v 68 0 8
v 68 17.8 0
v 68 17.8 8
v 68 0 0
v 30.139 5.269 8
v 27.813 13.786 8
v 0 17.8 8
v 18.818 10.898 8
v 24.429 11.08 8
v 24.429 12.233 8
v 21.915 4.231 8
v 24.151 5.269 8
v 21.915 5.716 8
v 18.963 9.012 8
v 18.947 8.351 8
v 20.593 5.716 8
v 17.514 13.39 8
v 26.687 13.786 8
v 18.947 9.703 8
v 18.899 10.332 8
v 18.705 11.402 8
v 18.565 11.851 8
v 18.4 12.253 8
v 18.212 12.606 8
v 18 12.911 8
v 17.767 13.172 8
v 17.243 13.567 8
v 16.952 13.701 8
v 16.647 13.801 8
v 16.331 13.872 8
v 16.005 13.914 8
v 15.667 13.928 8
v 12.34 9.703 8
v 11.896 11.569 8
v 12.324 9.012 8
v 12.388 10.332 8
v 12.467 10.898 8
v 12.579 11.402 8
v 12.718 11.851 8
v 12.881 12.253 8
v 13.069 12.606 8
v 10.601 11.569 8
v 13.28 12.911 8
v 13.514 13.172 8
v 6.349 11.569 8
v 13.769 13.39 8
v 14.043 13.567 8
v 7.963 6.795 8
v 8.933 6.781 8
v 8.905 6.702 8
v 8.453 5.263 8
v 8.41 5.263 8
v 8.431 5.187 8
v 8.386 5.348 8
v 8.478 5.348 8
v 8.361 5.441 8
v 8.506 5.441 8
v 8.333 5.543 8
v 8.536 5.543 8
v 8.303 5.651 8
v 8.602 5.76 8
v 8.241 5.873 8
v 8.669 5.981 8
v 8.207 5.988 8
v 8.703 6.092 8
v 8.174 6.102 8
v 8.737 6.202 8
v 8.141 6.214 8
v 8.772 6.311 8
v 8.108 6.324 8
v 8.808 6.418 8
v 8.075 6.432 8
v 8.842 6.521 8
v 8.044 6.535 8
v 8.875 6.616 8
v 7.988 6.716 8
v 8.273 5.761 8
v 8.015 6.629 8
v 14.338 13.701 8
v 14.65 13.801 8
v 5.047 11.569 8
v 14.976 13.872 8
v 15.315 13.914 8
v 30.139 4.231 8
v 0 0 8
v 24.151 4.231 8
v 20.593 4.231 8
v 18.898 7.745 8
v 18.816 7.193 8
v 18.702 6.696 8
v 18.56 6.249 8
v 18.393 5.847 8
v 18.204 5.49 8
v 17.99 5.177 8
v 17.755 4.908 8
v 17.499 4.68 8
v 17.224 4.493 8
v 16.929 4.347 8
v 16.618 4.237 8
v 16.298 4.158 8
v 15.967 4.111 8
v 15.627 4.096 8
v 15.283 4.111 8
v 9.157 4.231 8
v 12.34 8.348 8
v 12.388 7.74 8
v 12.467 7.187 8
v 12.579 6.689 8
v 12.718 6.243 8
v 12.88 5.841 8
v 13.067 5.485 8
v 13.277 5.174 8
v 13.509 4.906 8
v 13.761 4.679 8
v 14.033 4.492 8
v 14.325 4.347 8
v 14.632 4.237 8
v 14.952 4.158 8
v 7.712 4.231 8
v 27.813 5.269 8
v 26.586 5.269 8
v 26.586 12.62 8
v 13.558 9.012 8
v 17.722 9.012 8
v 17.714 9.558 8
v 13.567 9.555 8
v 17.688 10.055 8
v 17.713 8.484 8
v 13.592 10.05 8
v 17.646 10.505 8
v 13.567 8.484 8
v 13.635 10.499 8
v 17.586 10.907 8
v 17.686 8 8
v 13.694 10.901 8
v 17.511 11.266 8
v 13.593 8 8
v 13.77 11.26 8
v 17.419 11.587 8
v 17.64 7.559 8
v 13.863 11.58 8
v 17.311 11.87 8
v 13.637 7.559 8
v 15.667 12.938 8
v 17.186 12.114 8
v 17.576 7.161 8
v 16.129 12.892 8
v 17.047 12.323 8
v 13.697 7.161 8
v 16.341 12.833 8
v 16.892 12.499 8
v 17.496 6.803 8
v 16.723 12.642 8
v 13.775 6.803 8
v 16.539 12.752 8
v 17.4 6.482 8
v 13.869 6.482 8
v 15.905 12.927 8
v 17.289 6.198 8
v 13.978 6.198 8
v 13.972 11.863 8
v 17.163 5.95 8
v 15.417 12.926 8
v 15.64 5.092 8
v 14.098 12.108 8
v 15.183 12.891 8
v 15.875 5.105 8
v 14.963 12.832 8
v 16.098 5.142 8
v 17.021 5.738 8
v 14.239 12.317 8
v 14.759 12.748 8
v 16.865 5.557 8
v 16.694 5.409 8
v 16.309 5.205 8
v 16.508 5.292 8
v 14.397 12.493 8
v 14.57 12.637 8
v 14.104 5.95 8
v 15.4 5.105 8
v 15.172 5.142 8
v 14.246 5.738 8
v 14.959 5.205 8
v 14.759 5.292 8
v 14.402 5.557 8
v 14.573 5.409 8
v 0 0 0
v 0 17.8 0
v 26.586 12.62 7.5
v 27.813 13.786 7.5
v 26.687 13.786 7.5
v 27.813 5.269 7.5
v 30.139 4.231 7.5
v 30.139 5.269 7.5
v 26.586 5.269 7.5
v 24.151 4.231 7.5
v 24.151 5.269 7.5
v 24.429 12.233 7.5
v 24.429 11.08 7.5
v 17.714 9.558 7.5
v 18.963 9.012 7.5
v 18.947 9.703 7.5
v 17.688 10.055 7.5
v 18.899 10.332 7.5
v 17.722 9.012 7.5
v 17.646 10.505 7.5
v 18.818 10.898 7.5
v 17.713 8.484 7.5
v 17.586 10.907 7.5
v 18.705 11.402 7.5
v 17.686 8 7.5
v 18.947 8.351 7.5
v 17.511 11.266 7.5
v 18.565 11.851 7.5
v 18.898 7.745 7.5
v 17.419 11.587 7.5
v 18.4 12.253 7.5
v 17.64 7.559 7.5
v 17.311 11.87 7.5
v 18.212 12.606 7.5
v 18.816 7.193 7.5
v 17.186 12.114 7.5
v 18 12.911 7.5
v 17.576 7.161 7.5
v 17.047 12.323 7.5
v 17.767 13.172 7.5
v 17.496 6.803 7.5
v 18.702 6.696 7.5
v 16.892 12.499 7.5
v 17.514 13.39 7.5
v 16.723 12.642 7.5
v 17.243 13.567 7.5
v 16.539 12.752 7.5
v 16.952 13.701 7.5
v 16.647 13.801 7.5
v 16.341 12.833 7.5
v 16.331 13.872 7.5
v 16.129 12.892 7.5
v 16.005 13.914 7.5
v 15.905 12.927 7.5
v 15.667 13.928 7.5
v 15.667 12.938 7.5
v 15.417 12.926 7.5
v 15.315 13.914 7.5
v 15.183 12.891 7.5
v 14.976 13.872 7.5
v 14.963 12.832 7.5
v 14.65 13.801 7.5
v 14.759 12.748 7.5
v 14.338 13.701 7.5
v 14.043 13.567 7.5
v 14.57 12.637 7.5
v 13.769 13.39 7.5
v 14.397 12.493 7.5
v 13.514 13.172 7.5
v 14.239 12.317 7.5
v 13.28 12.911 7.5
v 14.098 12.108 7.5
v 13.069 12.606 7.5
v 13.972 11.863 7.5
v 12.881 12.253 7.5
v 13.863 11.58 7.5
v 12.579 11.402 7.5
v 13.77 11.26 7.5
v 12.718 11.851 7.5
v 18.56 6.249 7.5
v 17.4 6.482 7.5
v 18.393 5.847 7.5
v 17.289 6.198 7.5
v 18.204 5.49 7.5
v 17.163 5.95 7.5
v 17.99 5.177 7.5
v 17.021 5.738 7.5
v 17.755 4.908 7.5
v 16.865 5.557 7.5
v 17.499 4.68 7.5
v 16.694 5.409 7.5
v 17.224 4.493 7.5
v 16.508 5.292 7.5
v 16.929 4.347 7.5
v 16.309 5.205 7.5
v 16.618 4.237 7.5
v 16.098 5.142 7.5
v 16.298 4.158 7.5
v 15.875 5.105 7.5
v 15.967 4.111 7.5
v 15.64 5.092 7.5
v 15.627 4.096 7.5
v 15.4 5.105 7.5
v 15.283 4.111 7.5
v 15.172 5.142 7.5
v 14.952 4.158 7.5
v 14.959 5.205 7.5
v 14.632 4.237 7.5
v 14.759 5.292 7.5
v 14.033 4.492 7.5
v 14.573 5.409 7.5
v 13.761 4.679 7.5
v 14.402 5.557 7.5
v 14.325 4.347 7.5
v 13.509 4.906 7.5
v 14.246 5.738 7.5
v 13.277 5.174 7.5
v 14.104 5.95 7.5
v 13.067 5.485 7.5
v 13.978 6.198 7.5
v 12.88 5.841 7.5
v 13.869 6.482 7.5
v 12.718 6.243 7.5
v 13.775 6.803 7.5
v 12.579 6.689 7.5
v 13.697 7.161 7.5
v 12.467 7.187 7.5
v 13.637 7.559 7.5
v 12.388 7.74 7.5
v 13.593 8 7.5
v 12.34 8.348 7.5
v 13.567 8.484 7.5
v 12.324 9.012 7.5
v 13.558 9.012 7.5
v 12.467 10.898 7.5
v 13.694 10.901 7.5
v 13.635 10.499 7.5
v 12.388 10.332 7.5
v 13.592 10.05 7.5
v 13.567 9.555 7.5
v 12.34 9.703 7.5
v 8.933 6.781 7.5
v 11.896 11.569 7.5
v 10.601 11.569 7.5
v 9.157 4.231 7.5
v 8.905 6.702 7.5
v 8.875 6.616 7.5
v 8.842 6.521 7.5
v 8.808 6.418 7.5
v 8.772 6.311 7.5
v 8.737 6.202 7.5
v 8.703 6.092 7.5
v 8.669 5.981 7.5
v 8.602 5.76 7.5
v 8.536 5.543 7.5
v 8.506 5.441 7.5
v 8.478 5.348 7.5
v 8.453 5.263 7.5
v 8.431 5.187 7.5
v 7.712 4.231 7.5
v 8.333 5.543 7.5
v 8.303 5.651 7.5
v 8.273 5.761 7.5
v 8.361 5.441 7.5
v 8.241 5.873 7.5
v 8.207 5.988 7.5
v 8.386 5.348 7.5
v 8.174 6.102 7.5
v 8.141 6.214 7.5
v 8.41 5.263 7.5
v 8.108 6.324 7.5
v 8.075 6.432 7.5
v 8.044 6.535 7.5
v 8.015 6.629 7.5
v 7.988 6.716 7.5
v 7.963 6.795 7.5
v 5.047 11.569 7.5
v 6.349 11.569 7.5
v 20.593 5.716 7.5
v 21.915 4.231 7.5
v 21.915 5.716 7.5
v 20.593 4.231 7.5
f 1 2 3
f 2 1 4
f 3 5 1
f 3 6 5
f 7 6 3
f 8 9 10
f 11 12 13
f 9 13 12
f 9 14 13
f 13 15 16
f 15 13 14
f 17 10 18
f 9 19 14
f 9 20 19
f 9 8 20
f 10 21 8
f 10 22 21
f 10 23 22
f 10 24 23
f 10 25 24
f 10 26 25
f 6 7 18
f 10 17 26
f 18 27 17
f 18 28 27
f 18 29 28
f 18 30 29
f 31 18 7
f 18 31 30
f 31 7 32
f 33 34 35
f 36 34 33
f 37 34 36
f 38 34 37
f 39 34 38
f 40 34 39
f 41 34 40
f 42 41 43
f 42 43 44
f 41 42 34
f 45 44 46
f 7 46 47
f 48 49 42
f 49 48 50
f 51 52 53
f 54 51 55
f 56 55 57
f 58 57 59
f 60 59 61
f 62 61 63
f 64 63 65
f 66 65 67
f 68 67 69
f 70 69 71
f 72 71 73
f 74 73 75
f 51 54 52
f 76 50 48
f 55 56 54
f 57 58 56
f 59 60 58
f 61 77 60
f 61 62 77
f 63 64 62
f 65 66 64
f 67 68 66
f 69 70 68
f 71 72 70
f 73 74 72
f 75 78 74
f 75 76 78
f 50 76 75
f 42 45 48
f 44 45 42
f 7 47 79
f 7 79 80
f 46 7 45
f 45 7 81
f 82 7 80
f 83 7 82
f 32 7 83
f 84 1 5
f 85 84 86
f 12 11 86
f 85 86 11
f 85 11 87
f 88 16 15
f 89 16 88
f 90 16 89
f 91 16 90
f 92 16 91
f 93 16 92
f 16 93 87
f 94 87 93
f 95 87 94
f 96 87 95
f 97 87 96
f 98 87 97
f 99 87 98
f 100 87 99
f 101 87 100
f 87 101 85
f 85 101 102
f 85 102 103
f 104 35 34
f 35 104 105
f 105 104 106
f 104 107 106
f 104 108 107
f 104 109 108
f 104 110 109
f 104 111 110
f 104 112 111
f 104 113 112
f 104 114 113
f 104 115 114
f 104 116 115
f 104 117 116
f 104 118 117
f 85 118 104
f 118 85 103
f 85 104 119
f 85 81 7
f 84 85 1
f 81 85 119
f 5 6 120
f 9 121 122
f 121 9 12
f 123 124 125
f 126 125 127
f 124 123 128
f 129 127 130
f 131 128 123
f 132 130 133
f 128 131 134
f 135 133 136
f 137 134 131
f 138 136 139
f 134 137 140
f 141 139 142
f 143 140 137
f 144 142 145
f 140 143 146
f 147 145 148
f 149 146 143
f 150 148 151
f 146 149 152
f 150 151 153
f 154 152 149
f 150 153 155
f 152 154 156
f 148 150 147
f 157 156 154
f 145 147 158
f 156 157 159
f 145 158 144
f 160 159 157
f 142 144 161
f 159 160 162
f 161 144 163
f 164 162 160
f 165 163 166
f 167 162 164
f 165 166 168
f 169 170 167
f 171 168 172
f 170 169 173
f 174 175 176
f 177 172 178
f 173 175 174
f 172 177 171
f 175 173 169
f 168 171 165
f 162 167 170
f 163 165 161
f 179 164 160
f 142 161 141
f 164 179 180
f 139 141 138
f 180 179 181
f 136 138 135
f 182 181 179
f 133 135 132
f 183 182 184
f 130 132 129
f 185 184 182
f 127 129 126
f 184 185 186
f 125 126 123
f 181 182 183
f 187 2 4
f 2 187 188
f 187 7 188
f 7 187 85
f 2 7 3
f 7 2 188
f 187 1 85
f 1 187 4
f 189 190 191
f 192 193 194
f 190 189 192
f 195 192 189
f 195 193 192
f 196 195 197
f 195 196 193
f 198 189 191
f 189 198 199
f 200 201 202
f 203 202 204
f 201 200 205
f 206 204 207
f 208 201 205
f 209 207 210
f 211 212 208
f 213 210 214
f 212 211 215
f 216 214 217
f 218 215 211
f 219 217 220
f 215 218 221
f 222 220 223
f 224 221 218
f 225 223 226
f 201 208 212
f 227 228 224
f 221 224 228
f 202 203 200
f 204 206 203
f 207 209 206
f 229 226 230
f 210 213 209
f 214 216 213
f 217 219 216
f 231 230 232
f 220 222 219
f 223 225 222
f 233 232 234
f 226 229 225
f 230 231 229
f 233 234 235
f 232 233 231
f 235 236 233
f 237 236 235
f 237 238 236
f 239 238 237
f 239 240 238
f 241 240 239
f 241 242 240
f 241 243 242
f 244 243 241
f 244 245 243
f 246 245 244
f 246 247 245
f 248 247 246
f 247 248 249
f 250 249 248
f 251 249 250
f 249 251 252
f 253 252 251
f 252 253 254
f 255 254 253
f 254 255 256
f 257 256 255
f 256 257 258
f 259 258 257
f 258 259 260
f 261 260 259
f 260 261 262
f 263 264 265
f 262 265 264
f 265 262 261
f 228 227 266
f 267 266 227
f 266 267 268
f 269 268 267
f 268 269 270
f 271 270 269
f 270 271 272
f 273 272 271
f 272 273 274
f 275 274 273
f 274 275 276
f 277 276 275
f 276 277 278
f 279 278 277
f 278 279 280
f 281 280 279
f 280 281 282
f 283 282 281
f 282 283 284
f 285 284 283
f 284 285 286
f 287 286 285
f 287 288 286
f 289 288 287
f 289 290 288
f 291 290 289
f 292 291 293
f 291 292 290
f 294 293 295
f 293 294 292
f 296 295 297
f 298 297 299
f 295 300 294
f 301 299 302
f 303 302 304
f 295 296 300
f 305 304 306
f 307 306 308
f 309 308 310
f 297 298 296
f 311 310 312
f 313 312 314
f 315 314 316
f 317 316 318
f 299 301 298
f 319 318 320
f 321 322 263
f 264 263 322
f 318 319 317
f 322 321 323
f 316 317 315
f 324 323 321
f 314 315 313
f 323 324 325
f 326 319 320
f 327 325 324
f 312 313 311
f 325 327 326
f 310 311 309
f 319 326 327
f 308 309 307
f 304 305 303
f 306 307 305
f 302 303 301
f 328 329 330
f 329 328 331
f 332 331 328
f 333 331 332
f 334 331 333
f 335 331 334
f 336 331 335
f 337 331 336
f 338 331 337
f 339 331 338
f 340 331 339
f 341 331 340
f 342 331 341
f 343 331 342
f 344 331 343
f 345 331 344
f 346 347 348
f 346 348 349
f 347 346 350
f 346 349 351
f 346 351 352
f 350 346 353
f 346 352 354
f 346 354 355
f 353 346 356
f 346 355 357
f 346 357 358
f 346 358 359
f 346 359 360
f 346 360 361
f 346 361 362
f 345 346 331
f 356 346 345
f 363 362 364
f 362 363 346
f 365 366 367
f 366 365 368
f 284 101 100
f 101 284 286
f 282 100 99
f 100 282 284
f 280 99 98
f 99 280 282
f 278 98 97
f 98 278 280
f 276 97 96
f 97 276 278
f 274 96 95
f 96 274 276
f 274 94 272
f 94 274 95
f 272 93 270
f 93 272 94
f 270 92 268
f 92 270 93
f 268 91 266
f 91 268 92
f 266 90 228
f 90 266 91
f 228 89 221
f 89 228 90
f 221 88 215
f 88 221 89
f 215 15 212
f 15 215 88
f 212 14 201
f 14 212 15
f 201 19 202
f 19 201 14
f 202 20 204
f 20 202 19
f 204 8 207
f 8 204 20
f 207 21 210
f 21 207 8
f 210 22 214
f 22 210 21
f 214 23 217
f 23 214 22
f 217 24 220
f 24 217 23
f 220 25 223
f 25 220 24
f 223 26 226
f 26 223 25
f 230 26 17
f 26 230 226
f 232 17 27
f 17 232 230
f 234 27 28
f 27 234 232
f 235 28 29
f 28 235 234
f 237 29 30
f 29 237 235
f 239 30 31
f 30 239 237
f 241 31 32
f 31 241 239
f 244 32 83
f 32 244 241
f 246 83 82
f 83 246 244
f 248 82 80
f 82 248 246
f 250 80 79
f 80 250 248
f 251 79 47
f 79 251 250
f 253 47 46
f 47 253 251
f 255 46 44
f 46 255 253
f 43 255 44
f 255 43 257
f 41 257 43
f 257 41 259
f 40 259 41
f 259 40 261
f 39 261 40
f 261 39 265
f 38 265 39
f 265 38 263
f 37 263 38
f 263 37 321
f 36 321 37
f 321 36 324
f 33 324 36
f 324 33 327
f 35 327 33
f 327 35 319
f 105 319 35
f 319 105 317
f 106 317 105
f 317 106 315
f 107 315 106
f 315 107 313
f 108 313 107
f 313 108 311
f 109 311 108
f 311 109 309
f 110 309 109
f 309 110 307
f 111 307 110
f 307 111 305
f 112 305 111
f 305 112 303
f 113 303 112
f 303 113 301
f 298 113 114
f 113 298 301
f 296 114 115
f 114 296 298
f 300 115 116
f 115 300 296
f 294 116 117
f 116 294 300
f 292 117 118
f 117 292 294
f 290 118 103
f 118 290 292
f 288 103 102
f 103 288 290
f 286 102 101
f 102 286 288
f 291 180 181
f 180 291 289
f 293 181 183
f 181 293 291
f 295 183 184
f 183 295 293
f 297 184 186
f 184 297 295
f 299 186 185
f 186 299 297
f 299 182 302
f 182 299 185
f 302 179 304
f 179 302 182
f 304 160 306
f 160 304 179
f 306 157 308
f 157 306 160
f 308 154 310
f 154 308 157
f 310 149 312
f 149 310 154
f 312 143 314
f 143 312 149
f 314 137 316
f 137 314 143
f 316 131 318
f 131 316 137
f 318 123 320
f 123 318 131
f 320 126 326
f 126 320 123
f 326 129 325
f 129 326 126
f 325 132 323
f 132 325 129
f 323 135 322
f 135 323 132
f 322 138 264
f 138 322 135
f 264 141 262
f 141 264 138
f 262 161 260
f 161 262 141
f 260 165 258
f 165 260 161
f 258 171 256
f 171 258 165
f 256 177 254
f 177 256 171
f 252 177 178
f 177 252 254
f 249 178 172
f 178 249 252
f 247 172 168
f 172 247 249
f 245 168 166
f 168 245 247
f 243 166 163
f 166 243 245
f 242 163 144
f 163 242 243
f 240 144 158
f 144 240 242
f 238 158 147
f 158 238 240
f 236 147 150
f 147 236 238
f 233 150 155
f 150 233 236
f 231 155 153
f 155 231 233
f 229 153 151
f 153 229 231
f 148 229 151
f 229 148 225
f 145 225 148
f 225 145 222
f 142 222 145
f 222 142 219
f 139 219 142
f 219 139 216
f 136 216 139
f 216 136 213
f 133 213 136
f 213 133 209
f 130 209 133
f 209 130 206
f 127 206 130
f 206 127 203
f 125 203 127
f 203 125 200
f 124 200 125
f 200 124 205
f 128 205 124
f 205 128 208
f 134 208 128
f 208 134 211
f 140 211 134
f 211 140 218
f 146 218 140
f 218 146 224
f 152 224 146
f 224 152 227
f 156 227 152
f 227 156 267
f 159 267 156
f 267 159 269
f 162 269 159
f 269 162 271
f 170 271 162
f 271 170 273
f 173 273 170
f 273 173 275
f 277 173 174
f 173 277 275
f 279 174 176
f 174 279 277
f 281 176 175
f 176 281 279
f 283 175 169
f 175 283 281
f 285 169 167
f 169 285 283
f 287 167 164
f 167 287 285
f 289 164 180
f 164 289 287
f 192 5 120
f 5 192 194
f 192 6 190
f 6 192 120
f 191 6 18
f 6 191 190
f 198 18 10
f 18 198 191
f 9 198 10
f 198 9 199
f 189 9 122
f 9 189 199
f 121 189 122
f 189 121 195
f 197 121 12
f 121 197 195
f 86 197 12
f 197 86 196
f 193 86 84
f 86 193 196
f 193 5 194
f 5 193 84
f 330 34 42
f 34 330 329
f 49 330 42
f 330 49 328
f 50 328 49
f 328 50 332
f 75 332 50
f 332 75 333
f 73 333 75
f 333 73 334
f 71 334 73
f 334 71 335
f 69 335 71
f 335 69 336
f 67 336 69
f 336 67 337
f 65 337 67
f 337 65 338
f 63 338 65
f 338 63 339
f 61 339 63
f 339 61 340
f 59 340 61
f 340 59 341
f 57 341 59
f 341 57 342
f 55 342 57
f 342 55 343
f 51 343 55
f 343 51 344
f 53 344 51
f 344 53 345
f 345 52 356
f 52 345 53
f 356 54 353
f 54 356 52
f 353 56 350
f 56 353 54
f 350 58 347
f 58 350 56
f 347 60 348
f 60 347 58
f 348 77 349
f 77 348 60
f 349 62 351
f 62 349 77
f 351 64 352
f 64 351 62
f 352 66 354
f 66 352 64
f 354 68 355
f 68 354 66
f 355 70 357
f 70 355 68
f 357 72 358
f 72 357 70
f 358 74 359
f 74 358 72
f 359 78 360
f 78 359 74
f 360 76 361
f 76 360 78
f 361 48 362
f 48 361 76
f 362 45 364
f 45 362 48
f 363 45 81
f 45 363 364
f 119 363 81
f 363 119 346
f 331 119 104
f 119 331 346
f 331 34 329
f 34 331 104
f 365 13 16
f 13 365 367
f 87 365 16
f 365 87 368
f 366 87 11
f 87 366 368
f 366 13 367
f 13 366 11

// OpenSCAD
// PB-3 battery pack simplification: single solid block matching the outer envelope.
// Dimensions drawn from measurement photos (measurements/IMG_9373.jpeg–IMG_9385.jpeg)
// and the Stereo2Go teardown cached in research/.
// Units: millimetres.

module pb3_pack_fitting_test() {
    outer_len = 68; 
    outer_width = 17.8;
    outer_height = 8;
    textH=.5; textS=10;
    wiggle=.01;
    difference(){
        cube([outer_len, outer_width, outer_height]);
        translate([textS/2, outer_width/2,outer_height-textH]) linear_extrude(.5+wiggle) text("v0.1",size=textS,valign="center");
    }
}

pb3_pack_fitting_test();
